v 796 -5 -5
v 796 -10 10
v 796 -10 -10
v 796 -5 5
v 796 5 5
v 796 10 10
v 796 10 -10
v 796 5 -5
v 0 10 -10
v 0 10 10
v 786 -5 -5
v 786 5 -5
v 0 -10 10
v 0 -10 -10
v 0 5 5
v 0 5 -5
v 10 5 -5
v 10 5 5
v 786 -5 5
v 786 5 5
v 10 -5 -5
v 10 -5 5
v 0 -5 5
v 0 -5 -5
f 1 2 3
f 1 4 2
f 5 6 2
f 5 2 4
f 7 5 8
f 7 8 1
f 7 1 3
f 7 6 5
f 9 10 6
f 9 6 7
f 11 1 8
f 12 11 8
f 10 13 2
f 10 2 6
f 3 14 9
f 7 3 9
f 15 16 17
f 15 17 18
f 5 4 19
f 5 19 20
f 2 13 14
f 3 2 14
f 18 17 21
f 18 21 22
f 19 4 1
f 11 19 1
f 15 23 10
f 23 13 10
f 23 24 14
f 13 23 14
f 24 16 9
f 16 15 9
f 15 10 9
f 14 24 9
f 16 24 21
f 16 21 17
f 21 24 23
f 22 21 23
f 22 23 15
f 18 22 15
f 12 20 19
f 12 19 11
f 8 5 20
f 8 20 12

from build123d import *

# Parameters (mm, degrees)
SKETCH1_W           = 20
SKETCH1_H           = 20
BOSS_EXTRUDE1_DEPTH = 796
SKETCH3_W           = 10
SKETCH3_H           = 10
CUT_EXTRUDE1_DEPTH  = 10
SKETCH4_W           = 10
SKETCH4_H           = 10
CUT_EXTRUDE2_DEPTH  = 10


with BuildPart() as part:
    # Sketch1 → Boss-Extrude1 (new body)
    with BuildSketch(Plane(origin=(0, 0, 0), x_dir=(0, 0, -1), z_dir=(1, 0, 0))):
        Rectangle(SKETCH1_W, SKETCH1_H)
    extrude(amount=BOSS_EXTRUDE1_DEPTH)

    # Sketch3 → Cut-Extrude1 (cut)
    with BuildSketch(Plane(origin=(796, 0, 0), x_dir=(0, 0, -1), z_dir=(1, 0, 0))):
        Rectangle(SKETCH3_W, SKETCH3_H)
    extrude(amount=-CUT_EXTRUDE1_DEPTH, mode=Mode.SUBTRACT)

    # Sketch4 → Cut-Extrude2 (cut)
    with BuildSketch(Plane.ZY):
        Rectangle(SKETCH4_W, SKETCH4_H)
    extrude(amount=-CUT_EXTRUDE2_DEPTH, mode=Mode.SUBTRACT)


solid = part.part
